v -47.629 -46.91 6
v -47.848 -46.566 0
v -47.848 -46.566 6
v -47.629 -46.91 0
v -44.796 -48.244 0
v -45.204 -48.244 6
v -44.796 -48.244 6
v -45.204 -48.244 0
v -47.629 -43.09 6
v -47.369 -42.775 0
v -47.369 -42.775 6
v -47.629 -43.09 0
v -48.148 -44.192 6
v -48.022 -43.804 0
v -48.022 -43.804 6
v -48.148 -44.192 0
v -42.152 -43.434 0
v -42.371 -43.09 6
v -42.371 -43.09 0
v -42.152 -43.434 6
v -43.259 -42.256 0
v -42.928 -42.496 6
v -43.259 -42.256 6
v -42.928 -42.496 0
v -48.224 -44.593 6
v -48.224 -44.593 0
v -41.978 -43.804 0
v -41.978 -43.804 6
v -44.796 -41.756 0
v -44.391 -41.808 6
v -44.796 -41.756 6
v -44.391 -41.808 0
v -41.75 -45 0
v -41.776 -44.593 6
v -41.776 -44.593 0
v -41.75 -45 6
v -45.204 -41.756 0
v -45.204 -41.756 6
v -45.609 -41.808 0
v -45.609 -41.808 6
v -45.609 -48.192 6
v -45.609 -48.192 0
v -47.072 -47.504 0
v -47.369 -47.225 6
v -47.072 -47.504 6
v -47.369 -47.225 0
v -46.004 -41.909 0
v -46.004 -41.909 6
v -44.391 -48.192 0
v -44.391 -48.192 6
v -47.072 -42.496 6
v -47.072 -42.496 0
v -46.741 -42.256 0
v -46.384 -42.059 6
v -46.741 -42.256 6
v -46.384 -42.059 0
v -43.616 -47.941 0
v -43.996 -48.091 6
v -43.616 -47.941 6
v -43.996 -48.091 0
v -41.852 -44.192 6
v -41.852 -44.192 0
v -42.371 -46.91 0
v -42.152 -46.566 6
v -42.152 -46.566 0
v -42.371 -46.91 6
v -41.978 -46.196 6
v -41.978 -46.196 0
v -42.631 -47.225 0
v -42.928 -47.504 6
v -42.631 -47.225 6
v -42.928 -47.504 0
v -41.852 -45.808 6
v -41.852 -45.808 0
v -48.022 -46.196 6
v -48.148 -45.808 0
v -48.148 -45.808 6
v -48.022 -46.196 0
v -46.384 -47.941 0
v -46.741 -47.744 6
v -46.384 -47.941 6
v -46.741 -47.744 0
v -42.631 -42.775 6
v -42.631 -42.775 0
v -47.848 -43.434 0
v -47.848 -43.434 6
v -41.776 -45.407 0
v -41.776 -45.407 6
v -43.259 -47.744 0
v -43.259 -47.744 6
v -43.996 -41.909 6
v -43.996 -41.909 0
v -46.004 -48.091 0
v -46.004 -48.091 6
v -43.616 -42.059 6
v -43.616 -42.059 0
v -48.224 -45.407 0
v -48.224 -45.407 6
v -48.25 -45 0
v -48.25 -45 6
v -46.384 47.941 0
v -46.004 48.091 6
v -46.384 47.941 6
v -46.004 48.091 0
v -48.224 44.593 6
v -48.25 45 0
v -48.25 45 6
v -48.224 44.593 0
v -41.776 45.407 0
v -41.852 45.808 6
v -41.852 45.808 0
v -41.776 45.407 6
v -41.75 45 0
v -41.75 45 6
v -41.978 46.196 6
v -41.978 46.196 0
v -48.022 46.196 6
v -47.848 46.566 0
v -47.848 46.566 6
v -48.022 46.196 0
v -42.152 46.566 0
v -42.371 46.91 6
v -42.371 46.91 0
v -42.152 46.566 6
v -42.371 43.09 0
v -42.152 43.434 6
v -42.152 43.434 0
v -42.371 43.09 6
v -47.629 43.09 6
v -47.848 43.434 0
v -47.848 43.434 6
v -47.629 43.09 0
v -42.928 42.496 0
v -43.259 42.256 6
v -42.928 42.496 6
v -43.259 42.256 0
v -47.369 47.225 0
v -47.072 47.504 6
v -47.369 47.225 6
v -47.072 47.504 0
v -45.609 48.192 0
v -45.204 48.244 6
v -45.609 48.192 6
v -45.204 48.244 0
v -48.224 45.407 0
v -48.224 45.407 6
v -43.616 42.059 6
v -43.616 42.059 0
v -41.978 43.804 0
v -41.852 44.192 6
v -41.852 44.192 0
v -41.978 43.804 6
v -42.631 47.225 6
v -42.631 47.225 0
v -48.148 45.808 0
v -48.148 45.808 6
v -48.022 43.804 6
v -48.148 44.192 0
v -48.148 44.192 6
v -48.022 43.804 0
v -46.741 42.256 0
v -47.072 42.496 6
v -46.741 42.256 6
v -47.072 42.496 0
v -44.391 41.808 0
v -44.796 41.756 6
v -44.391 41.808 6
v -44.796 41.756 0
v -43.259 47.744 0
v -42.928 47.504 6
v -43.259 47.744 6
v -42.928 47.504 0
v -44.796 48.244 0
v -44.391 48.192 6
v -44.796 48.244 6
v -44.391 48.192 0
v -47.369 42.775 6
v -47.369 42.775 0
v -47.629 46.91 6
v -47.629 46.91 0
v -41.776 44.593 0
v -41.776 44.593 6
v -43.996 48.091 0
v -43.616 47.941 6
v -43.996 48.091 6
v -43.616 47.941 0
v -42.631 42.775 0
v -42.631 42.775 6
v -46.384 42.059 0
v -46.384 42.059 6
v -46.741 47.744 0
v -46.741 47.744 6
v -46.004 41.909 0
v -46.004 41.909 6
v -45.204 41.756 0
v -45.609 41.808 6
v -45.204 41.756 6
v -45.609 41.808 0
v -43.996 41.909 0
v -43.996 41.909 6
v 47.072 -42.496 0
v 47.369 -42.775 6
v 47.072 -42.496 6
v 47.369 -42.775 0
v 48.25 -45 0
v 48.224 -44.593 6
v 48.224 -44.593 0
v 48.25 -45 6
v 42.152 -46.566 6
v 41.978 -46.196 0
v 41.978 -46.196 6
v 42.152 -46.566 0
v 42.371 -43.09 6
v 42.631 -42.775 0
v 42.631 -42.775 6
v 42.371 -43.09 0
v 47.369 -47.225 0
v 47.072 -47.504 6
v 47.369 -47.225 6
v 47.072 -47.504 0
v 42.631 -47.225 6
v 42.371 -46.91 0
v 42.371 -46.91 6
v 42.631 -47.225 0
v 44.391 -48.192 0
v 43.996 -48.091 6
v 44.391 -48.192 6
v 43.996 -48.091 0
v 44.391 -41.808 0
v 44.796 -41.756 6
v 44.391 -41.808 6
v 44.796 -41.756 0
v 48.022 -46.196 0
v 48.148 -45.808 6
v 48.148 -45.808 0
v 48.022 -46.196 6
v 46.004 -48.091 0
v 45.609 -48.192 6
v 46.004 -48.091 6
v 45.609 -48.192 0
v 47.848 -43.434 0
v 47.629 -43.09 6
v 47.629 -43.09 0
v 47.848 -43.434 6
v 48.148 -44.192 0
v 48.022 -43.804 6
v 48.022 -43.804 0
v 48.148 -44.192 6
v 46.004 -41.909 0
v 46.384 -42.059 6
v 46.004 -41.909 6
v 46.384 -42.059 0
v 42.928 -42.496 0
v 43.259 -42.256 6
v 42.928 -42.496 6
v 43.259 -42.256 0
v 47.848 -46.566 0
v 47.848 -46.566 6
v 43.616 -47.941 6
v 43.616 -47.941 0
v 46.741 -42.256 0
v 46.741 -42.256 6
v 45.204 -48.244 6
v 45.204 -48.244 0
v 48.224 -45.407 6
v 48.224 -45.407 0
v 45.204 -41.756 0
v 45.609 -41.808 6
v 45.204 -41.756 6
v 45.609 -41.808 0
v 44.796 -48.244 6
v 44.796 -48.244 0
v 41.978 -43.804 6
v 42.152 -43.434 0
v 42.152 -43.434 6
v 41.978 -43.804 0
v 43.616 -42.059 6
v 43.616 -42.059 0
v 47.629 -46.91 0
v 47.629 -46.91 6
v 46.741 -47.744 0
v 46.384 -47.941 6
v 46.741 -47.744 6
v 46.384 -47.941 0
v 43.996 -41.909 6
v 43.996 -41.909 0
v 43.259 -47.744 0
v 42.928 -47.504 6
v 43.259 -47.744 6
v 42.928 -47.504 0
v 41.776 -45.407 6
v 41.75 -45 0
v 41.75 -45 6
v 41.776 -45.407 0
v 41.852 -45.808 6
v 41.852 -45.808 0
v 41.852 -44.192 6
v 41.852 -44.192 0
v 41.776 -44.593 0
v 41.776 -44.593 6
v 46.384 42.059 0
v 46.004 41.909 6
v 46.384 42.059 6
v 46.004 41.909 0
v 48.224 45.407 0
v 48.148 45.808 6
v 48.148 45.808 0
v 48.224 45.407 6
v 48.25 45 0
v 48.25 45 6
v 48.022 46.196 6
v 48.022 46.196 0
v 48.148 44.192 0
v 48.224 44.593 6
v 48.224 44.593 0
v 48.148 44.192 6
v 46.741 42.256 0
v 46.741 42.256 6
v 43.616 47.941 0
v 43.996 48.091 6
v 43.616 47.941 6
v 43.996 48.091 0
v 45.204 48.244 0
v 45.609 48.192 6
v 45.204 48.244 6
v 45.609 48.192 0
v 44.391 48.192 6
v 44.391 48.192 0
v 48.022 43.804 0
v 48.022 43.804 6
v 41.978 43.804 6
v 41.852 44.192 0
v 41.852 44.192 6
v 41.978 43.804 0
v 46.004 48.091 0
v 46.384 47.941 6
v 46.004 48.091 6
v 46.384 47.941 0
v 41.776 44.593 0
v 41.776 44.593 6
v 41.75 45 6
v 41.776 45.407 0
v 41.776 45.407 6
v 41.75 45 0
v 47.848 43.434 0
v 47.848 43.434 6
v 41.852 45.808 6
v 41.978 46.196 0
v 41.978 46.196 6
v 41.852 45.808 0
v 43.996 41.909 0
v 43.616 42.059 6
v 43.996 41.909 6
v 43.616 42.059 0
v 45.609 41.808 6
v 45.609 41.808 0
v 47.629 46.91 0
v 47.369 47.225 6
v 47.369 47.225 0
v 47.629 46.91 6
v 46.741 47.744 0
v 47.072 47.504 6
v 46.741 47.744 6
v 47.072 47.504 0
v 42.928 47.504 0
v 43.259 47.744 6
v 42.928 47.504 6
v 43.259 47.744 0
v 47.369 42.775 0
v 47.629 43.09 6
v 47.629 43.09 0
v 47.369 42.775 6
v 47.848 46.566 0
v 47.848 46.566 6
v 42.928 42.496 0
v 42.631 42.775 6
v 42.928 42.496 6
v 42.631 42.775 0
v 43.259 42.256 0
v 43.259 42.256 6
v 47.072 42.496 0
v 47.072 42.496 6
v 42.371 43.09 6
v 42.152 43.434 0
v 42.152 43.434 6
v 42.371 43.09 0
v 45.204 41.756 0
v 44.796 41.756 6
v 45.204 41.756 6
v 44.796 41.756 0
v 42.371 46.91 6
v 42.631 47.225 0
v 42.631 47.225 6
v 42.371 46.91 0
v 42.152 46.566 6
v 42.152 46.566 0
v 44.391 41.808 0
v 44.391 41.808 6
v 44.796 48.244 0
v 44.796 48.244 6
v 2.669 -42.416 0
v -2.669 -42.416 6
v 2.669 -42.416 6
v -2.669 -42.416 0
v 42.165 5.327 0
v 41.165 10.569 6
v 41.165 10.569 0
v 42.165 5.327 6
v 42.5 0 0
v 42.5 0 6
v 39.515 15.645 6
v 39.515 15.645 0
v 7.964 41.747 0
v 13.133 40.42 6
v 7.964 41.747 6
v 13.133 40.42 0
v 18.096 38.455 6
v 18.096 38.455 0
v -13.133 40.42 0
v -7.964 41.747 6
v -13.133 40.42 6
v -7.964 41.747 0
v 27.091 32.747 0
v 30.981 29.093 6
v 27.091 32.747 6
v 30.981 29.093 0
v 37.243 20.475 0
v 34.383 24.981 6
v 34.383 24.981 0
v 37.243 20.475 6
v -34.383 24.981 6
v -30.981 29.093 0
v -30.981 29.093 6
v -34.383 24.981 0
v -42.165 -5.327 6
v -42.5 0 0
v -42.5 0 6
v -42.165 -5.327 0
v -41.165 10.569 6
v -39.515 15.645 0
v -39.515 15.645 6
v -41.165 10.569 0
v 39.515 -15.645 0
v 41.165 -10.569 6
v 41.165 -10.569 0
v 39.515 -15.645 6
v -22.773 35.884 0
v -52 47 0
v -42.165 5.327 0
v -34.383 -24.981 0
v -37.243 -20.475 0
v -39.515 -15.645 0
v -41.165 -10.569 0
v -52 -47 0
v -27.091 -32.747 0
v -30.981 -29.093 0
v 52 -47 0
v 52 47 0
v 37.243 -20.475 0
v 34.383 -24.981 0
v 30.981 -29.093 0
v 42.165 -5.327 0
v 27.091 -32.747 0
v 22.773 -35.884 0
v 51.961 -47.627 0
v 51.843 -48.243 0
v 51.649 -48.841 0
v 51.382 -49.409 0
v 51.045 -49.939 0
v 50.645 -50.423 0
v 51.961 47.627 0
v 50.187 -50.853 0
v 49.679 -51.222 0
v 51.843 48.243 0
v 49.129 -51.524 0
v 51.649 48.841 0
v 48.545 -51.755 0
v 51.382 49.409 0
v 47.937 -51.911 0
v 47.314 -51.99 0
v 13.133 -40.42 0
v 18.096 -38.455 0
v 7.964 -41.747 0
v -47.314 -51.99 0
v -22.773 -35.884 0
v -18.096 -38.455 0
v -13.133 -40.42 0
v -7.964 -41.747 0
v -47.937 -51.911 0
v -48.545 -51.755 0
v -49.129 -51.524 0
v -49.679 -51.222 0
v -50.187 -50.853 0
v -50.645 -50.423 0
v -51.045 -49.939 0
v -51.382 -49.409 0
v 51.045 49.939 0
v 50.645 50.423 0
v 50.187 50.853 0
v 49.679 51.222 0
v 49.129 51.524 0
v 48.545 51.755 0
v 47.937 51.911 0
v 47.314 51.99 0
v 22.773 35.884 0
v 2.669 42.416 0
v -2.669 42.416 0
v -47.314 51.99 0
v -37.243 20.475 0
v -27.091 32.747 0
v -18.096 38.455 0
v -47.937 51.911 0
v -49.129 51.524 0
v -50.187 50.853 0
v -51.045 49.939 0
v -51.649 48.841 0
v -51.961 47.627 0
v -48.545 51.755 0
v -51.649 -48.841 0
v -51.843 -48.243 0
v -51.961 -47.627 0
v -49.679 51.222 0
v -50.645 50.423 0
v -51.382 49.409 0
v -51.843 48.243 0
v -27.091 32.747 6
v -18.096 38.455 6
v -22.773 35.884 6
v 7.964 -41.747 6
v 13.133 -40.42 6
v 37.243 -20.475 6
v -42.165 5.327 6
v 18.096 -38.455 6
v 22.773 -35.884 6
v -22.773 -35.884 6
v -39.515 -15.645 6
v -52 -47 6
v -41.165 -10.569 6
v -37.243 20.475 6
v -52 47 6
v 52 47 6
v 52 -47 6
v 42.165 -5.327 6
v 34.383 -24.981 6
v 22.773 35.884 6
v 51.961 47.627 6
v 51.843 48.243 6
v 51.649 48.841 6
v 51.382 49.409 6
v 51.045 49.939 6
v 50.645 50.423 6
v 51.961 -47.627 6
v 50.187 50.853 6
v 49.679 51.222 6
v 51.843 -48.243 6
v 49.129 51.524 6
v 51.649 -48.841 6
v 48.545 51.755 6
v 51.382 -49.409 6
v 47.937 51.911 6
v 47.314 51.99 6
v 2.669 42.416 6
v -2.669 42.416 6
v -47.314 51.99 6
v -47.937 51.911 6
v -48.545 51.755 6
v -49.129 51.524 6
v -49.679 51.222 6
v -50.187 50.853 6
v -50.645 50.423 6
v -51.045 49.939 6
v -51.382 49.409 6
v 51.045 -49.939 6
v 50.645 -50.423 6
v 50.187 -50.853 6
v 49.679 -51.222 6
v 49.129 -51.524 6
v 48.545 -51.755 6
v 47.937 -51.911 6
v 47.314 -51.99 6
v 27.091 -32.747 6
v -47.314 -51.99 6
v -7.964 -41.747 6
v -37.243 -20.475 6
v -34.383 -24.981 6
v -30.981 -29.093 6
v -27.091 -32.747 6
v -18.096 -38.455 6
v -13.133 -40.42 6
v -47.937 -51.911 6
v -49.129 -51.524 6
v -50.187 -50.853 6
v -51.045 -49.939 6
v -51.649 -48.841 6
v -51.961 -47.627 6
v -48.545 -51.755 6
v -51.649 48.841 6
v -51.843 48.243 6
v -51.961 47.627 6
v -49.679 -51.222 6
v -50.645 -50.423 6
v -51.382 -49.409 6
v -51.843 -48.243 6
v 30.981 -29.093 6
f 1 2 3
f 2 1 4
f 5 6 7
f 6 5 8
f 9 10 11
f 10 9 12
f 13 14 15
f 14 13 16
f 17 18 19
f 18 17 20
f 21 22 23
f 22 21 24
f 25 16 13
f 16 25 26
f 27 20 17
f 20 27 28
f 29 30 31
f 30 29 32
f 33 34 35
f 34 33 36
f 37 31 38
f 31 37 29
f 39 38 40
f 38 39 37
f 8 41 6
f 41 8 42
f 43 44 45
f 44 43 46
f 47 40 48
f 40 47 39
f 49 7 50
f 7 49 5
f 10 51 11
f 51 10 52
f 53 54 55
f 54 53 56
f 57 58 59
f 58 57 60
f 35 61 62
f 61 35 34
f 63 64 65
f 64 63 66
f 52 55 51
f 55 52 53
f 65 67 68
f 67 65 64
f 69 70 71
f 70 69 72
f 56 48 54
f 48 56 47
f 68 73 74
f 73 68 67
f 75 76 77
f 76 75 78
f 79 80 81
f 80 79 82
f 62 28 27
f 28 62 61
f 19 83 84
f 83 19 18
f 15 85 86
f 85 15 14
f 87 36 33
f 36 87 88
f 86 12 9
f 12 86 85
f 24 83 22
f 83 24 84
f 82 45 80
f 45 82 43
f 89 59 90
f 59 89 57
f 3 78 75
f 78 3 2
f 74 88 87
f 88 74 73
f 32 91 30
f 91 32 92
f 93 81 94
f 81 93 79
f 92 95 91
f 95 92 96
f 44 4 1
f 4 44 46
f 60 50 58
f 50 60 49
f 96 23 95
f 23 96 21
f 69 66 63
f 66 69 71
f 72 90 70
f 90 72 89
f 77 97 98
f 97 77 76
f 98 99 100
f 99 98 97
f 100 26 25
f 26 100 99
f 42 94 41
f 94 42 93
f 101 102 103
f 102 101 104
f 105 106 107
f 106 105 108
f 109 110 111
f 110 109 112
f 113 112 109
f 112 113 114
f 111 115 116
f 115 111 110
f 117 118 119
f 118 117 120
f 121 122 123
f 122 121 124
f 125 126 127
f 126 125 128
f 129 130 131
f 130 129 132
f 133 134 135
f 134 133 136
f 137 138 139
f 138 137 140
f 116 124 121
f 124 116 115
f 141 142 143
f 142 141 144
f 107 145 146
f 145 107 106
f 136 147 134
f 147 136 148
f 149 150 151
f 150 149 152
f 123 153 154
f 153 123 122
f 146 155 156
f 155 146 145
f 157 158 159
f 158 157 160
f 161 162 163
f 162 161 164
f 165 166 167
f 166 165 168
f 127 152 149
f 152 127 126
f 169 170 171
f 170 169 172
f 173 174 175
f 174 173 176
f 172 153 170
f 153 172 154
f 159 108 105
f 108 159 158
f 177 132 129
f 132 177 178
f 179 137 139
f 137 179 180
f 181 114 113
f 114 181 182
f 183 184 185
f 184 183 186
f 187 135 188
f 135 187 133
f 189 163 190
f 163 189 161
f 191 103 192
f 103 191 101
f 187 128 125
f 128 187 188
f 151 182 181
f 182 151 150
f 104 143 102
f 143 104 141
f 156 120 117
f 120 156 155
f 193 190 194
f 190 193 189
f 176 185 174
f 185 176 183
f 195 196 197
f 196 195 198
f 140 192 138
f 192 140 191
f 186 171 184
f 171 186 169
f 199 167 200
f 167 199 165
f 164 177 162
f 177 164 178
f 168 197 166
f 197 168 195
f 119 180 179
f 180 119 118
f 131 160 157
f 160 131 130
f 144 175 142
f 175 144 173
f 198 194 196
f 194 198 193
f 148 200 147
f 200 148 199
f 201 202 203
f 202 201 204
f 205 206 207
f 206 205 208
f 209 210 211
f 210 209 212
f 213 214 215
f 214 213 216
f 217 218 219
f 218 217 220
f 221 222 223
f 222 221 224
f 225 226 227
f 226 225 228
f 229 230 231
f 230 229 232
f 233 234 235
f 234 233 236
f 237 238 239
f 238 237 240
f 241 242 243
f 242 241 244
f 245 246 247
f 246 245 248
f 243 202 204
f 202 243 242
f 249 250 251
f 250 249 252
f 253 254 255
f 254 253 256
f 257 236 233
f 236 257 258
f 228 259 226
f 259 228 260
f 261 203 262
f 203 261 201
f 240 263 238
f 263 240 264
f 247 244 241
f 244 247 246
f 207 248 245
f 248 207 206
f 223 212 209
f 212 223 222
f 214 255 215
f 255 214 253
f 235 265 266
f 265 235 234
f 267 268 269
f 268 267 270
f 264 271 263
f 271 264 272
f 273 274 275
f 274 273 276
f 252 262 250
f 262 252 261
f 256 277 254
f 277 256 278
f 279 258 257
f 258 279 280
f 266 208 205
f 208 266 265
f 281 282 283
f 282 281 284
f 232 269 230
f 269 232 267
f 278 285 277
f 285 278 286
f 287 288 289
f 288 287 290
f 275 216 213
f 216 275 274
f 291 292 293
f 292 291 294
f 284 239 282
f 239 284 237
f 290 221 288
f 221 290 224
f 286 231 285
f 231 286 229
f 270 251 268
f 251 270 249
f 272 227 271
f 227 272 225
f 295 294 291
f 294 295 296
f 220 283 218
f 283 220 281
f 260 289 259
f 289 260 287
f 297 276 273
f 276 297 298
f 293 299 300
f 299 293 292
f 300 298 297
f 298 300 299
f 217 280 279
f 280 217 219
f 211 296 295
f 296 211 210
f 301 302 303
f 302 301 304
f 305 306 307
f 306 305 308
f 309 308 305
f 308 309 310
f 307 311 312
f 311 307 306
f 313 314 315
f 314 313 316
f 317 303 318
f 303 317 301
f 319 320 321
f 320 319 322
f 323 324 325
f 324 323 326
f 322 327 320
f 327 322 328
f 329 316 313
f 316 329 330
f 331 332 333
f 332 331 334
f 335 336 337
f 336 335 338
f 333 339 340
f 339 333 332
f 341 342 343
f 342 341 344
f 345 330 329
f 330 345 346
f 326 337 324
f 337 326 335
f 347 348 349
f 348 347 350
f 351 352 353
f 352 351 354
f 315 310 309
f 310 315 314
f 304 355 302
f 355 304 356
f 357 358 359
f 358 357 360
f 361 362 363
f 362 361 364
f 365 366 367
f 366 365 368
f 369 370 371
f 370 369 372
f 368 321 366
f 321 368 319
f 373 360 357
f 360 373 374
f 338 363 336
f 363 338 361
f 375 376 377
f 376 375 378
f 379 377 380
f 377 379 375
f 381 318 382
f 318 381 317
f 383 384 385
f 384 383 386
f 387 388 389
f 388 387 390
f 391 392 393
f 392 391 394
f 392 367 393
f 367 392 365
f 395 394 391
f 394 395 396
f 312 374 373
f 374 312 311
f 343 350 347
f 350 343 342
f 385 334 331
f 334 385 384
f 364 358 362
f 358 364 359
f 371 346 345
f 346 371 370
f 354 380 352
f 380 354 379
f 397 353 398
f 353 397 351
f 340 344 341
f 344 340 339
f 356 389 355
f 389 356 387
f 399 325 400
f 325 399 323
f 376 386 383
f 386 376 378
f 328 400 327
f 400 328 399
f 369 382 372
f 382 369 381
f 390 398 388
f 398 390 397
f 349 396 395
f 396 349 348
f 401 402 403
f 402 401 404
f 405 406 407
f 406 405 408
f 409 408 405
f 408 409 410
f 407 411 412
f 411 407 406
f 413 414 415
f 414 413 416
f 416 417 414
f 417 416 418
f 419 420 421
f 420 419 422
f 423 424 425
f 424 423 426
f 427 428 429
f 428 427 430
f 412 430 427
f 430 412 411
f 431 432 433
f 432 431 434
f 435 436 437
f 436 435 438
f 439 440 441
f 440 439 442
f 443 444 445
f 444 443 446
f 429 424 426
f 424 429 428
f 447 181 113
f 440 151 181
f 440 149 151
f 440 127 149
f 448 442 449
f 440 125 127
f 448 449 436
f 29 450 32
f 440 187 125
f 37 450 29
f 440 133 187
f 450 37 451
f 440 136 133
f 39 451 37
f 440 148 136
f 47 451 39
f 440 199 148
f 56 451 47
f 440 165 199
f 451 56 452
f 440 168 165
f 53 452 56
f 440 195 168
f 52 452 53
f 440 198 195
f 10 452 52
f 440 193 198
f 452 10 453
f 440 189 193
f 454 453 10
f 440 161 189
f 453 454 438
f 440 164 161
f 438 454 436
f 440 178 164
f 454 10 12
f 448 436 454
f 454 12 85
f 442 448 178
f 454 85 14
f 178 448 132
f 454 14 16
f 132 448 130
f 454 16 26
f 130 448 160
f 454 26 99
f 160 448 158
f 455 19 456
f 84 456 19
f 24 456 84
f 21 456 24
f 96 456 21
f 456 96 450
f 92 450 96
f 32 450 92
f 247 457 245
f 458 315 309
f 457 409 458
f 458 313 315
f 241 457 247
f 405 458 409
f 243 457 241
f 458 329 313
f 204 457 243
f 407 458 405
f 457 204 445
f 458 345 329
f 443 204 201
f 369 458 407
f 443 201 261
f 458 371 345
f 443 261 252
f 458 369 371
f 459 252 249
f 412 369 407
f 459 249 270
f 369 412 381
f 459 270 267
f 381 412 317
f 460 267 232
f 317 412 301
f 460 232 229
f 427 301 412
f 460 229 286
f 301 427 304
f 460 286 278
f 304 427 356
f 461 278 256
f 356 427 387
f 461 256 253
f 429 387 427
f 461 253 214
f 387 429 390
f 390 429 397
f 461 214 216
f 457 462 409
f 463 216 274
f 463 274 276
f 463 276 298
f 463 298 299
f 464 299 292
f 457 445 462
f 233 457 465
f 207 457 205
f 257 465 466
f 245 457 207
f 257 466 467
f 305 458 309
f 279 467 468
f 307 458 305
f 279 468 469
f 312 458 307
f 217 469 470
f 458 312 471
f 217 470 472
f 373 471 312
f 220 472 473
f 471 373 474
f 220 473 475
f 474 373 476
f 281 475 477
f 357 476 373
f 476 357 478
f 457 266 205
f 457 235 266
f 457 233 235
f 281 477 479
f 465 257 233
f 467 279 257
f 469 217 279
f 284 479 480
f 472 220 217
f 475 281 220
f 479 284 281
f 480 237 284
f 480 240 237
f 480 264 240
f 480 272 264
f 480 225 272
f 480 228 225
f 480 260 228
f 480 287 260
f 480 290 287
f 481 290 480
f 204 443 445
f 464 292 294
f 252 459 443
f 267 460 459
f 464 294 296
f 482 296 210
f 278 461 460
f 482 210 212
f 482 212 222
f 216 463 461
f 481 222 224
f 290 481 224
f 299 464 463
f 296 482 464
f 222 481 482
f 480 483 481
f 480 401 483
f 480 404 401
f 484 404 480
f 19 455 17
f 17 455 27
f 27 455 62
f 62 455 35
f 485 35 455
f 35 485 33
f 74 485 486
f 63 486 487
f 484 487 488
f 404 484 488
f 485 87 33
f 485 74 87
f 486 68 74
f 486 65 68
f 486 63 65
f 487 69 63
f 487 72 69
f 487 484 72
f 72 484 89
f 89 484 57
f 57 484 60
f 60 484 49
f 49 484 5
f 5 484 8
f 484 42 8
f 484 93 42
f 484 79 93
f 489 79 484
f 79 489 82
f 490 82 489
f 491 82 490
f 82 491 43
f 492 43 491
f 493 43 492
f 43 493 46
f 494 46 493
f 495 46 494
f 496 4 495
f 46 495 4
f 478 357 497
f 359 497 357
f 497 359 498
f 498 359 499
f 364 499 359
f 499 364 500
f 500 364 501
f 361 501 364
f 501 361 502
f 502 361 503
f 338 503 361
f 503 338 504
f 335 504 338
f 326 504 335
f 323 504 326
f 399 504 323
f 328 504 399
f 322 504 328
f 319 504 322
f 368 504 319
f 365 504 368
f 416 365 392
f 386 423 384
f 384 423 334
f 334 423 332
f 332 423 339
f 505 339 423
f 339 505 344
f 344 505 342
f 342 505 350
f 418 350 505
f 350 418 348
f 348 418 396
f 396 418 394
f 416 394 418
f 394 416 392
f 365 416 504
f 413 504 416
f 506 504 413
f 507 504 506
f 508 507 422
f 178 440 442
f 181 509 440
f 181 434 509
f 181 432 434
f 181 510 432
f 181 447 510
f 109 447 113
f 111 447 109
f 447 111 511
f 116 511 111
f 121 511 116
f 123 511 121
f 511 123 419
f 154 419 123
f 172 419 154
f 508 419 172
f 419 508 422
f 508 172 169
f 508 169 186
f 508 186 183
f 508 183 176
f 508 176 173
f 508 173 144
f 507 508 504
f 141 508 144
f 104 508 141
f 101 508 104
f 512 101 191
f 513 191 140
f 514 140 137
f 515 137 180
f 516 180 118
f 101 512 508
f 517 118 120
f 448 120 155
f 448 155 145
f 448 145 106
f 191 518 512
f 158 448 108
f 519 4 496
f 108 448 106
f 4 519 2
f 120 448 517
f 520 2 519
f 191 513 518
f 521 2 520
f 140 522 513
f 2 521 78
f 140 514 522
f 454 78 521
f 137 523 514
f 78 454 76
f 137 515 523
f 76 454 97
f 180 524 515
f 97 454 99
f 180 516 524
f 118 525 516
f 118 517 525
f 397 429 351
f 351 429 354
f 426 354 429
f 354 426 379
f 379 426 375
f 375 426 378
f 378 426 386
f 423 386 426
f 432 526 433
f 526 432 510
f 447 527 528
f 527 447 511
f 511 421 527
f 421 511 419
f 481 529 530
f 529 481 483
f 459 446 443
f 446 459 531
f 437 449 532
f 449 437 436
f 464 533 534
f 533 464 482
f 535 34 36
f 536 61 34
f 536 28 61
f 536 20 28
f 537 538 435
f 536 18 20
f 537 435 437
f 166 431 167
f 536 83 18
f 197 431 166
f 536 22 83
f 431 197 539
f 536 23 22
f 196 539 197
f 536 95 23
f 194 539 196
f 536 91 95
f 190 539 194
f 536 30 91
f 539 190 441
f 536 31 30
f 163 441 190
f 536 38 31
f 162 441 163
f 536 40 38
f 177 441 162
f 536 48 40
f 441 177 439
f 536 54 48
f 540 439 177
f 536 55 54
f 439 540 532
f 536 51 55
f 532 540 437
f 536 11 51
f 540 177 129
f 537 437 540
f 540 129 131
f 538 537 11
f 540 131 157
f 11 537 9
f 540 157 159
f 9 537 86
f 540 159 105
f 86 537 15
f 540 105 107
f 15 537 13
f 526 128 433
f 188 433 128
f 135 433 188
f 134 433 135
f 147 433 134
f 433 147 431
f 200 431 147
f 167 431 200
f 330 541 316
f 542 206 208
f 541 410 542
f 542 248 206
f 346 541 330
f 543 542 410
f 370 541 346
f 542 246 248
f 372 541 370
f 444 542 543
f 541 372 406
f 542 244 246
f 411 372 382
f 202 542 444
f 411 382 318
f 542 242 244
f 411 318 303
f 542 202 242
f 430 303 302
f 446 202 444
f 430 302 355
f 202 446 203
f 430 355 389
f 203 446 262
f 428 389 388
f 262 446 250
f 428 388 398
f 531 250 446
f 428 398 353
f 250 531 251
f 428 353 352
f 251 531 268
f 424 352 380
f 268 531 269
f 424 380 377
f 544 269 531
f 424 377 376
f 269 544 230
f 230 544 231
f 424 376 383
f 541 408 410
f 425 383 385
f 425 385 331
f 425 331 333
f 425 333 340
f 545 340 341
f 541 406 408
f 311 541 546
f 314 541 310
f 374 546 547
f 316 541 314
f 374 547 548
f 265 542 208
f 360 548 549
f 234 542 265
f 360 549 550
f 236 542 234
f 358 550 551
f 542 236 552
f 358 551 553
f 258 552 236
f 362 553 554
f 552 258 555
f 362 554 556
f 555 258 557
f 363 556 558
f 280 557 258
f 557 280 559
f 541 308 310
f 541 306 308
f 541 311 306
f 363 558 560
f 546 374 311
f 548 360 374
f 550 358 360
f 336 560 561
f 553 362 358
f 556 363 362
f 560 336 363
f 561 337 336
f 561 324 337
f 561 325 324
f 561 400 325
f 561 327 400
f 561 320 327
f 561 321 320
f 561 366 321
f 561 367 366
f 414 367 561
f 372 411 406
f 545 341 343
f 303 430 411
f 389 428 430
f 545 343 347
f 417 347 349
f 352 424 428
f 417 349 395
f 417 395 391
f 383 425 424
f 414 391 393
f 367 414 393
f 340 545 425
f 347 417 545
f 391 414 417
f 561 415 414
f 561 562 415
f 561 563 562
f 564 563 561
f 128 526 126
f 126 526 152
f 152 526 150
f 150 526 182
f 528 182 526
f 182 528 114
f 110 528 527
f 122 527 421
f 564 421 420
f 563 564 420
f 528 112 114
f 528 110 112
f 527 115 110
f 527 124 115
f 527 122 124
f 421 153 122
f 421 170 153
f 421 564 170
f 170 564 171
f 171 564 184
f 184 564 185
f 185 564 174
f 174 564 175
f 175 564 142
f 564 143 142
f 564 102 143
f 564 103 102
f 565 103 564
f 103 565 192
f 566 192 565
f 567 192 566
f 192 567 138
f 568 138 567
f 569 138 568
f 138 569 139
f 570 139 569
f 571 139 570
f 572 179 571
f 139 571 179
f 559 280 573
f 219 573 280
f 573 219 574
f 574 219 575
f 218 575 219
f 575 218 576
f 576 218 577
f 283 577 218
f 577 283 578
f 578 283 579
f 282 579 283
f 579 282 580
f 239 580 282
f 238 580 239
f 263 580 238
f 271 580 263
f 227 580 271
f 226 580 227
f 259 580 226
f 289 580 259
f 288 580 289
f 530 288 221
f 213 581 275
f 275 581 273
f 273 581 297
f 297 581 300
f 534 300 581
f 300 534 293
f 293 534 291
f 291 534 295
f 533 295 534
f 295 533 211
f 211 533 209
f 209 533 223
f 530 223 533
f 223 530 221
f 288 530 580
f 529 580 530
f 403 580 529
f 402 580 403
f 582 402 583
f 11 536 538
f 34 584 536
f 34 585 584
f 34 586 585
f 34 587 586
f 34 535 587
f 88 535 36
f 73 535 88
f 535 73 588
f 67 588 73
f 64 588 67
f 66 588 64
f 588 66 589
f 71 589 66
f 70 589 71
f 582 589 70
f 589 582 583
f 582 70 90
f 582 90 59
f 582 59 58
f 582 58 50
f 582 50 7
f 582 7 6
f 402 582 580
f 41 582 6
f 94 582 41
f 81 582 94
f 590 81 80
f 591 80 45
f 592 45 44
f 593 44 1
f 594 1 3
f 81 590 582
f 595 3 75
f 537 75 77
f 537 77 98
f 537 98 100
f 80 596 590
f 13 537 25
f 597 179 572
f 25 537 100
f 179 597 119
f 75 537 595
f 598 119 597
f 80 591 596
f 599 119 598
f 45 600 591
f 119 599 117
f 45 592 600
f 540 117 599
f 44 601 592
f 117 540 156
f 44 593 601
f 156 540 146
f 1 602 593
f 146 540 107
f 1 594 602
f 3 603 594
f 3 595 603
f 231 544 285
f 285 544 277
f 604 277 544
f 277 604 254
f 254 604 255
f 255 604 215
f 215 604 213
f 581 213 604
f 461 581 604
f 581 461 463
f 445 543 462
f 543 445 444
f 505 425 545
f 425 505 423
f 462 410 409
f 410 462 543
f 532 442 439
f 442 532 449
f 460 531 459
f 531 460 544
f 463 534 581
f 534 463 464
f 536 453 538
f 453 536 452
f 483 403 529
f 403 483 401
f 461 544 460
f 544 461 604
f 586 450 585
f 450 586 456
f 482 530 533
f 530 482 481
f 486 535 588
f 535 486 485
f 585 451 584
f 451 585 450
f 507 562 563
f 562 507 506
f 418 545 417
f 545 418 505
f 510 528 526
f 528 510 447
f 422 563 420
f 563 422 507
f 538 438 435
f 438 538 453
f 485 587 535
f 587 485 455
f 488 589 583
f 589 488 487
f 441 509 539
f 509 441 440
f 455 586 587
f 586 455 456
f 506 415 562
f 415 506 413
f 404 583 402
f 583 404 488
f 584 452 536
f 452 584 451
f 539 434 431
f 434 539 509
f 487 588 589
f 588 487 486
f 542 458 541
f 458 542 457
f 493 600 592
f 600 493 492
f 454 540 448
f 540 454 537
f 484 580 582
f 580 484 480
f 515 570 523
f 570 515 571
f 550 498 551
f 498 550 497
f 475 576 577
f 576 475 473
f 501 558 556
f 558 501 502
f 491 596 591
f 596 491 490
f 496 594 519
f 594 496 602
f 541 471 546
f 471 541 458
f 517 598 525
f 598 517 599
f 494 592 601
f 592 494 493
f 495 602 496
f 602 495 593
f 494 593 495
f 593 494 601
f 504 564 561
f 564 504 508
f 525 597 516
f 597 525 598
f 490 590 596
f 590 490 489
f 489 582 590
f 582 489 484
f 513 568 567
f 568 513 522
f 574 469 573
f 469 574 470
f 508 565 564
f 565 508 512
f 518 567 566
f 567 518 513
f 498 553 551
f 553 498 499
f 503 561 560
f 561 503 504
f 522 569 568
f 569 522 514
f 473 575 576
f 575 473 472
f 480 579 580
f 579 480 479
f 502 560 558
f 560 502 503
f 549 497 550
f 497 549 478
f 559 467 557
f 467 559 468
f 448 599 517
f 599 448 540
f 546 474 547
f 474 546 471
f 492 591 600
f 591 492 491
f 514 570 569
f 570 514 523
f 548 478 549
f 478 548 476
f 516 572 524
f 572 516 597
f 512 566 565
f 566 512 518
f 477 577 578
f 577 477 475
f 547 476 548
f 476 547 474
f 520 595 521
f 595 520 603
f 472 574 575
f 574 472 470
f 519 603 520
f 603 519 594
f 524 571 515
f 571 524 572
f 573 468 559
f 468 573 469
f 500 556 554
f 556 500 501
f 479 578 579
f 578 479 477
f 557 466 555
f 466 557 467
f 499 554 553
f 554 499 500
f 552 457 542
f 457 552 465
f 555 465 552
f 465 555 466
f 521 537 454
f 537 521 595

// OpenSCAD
$fn = 50;


difference() {
	union() {
		hull() {
			translate(v = [-47.0000000000, 47.0000000000, 0]) {
				cylinder(h = 6, r = 5);
			}
			translate(v = [47.0000000000, 47.0000000000, 0]) {
				cylinder(h = 6, r = 5);
			}
			translate(v = [-47.0000000000, -47.0000000000, 0]) {
				cylinder(h = 6, r = 5);
			}
			translate(v = [47.0000000000, -47.0000000000, 0]) {
				cylinder(h = 6, r = 5);
			}
		}
	}
	union() {
		#translate(v = [-45.0000000000, -45.0000000000, -100.0000000000]) {
			cylinder(h = 200, r = 3.2500000000);
		}
		#translate(v = [-45.0000000000, 45.0000000000, -100.0000000000]) {
			cylinder(h = 200, r = 3.2500000000);
		}
		#translate(v = [45.0000000000, -45.0000000000, -100.0000000000]) {
			cylinder(h = 200, r = 3.2500000000);
		}
		#translate(v = [45.0000000000, 45.0000000000, -100.0000000000]) {
			cylinder(h = 200, r = 3.2500000000);
		}
		#cylinder(h = 6, r = 42.5000000000);
	}
}
